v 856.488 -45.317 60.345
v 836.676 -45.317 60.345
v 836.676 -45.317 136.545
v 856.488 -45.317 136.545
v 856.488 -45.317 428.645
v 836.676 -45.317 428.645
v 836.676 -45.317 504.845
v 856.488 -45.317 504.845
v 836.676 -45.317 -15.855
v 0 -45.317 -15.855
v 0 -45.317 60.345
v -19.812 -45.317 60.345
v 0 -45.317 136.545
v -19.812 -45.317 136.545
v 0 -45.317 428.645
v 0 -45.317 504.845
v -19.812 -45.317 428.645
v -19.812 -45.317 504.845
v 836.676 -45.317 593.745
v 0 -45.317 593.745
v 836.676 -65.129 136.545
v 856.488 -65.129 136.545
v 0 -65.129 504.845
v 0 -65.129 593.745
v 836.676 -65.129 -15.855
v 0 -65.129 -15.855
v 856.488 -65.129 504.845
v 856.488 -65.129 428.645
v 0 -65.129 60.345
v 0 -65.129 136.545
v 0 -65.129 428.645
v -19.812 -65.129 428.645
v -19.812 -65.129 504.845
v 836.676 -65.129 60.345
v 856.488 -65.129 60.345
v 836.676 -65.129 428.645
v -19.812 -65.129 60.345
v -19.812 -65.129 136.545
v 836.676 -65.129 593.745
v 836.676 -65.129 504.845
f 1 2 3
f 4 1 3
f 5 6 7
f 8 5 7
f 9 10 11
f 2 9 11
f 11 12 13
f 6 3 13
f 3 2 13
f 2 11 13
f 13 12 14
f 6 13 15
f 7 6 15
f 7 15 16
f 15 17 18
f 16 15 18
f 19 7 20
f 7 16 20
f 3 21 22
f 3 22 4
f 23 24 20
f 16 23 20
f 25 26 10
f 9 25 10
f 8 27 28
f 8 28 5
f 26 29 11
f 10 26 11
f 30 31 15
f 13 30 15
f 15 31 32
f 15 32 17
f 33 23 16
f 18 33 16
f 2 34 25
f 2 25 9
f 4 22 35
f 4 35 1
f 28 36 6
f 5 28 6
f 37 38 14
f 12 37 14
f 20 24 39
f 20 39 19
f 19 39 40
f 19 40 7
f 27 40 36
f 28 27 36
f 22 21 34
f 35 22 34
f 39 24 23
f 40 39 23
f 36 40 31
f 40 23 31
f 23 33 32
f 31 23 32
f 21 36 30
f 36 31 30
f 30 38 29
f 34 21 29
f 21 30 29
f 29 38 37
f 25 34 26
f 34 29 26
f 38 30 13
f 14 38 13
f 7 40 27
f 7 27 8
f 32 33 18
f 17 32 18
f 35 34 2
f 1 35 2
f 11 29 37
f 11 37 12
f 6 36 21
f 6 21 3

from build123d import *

# Parameters (mm, degrees)
F0_W          = 19.812
F0_H          = 76.2
F0_H_2        = 88.9
F0_H_3        = 292.1
F1_DEPTH      = 836.676
F2_DEPTH      = 19.812
F2_DEPTH_BACK = 856.488


with BuildPart() as f1:
    # F0 (on Right) → F1 (new body)
    with BuildSketch(Plane.YZ):
        with Locations((-55.2229133244, 98.4447455046)):
            Rectangle(F0_W, F0_H)
        with Locations((-55.2229133244, 466.7447455046)):
            Rectangle(F0_W, F0_H)
        with Locations((-55.2229133244, 549.2947455046)):
            Rectangle(F0_W, F0_H_2)
        with Locations((-55.2229133244, 282.5947455046)):
            Rectangle(F0_W, F0_H_3)
        with Locations((-55.2229133244, 22.2447455046)):
            Rectangle(F0_W, F0_H)
    extrude(amount=F1_DEPTH)

    # F0 (on Right) → F2 (join, two sides)
    with BuildSketch(Plane.YZ) as f2_sk:
        with Locations((-55.2229133244, 466.7447455046)):
            Rectangle(F0_W, F0_H)
        with Locations((-55.2229133244, 98.4447455046)):
            Rectangle(F0_W, F0_H)
    extrude(amount=-F2_DEPTH)
    extrude(f2_sk.sketch, amount=F2_DEPTH_BACK)


solid = f1.part
